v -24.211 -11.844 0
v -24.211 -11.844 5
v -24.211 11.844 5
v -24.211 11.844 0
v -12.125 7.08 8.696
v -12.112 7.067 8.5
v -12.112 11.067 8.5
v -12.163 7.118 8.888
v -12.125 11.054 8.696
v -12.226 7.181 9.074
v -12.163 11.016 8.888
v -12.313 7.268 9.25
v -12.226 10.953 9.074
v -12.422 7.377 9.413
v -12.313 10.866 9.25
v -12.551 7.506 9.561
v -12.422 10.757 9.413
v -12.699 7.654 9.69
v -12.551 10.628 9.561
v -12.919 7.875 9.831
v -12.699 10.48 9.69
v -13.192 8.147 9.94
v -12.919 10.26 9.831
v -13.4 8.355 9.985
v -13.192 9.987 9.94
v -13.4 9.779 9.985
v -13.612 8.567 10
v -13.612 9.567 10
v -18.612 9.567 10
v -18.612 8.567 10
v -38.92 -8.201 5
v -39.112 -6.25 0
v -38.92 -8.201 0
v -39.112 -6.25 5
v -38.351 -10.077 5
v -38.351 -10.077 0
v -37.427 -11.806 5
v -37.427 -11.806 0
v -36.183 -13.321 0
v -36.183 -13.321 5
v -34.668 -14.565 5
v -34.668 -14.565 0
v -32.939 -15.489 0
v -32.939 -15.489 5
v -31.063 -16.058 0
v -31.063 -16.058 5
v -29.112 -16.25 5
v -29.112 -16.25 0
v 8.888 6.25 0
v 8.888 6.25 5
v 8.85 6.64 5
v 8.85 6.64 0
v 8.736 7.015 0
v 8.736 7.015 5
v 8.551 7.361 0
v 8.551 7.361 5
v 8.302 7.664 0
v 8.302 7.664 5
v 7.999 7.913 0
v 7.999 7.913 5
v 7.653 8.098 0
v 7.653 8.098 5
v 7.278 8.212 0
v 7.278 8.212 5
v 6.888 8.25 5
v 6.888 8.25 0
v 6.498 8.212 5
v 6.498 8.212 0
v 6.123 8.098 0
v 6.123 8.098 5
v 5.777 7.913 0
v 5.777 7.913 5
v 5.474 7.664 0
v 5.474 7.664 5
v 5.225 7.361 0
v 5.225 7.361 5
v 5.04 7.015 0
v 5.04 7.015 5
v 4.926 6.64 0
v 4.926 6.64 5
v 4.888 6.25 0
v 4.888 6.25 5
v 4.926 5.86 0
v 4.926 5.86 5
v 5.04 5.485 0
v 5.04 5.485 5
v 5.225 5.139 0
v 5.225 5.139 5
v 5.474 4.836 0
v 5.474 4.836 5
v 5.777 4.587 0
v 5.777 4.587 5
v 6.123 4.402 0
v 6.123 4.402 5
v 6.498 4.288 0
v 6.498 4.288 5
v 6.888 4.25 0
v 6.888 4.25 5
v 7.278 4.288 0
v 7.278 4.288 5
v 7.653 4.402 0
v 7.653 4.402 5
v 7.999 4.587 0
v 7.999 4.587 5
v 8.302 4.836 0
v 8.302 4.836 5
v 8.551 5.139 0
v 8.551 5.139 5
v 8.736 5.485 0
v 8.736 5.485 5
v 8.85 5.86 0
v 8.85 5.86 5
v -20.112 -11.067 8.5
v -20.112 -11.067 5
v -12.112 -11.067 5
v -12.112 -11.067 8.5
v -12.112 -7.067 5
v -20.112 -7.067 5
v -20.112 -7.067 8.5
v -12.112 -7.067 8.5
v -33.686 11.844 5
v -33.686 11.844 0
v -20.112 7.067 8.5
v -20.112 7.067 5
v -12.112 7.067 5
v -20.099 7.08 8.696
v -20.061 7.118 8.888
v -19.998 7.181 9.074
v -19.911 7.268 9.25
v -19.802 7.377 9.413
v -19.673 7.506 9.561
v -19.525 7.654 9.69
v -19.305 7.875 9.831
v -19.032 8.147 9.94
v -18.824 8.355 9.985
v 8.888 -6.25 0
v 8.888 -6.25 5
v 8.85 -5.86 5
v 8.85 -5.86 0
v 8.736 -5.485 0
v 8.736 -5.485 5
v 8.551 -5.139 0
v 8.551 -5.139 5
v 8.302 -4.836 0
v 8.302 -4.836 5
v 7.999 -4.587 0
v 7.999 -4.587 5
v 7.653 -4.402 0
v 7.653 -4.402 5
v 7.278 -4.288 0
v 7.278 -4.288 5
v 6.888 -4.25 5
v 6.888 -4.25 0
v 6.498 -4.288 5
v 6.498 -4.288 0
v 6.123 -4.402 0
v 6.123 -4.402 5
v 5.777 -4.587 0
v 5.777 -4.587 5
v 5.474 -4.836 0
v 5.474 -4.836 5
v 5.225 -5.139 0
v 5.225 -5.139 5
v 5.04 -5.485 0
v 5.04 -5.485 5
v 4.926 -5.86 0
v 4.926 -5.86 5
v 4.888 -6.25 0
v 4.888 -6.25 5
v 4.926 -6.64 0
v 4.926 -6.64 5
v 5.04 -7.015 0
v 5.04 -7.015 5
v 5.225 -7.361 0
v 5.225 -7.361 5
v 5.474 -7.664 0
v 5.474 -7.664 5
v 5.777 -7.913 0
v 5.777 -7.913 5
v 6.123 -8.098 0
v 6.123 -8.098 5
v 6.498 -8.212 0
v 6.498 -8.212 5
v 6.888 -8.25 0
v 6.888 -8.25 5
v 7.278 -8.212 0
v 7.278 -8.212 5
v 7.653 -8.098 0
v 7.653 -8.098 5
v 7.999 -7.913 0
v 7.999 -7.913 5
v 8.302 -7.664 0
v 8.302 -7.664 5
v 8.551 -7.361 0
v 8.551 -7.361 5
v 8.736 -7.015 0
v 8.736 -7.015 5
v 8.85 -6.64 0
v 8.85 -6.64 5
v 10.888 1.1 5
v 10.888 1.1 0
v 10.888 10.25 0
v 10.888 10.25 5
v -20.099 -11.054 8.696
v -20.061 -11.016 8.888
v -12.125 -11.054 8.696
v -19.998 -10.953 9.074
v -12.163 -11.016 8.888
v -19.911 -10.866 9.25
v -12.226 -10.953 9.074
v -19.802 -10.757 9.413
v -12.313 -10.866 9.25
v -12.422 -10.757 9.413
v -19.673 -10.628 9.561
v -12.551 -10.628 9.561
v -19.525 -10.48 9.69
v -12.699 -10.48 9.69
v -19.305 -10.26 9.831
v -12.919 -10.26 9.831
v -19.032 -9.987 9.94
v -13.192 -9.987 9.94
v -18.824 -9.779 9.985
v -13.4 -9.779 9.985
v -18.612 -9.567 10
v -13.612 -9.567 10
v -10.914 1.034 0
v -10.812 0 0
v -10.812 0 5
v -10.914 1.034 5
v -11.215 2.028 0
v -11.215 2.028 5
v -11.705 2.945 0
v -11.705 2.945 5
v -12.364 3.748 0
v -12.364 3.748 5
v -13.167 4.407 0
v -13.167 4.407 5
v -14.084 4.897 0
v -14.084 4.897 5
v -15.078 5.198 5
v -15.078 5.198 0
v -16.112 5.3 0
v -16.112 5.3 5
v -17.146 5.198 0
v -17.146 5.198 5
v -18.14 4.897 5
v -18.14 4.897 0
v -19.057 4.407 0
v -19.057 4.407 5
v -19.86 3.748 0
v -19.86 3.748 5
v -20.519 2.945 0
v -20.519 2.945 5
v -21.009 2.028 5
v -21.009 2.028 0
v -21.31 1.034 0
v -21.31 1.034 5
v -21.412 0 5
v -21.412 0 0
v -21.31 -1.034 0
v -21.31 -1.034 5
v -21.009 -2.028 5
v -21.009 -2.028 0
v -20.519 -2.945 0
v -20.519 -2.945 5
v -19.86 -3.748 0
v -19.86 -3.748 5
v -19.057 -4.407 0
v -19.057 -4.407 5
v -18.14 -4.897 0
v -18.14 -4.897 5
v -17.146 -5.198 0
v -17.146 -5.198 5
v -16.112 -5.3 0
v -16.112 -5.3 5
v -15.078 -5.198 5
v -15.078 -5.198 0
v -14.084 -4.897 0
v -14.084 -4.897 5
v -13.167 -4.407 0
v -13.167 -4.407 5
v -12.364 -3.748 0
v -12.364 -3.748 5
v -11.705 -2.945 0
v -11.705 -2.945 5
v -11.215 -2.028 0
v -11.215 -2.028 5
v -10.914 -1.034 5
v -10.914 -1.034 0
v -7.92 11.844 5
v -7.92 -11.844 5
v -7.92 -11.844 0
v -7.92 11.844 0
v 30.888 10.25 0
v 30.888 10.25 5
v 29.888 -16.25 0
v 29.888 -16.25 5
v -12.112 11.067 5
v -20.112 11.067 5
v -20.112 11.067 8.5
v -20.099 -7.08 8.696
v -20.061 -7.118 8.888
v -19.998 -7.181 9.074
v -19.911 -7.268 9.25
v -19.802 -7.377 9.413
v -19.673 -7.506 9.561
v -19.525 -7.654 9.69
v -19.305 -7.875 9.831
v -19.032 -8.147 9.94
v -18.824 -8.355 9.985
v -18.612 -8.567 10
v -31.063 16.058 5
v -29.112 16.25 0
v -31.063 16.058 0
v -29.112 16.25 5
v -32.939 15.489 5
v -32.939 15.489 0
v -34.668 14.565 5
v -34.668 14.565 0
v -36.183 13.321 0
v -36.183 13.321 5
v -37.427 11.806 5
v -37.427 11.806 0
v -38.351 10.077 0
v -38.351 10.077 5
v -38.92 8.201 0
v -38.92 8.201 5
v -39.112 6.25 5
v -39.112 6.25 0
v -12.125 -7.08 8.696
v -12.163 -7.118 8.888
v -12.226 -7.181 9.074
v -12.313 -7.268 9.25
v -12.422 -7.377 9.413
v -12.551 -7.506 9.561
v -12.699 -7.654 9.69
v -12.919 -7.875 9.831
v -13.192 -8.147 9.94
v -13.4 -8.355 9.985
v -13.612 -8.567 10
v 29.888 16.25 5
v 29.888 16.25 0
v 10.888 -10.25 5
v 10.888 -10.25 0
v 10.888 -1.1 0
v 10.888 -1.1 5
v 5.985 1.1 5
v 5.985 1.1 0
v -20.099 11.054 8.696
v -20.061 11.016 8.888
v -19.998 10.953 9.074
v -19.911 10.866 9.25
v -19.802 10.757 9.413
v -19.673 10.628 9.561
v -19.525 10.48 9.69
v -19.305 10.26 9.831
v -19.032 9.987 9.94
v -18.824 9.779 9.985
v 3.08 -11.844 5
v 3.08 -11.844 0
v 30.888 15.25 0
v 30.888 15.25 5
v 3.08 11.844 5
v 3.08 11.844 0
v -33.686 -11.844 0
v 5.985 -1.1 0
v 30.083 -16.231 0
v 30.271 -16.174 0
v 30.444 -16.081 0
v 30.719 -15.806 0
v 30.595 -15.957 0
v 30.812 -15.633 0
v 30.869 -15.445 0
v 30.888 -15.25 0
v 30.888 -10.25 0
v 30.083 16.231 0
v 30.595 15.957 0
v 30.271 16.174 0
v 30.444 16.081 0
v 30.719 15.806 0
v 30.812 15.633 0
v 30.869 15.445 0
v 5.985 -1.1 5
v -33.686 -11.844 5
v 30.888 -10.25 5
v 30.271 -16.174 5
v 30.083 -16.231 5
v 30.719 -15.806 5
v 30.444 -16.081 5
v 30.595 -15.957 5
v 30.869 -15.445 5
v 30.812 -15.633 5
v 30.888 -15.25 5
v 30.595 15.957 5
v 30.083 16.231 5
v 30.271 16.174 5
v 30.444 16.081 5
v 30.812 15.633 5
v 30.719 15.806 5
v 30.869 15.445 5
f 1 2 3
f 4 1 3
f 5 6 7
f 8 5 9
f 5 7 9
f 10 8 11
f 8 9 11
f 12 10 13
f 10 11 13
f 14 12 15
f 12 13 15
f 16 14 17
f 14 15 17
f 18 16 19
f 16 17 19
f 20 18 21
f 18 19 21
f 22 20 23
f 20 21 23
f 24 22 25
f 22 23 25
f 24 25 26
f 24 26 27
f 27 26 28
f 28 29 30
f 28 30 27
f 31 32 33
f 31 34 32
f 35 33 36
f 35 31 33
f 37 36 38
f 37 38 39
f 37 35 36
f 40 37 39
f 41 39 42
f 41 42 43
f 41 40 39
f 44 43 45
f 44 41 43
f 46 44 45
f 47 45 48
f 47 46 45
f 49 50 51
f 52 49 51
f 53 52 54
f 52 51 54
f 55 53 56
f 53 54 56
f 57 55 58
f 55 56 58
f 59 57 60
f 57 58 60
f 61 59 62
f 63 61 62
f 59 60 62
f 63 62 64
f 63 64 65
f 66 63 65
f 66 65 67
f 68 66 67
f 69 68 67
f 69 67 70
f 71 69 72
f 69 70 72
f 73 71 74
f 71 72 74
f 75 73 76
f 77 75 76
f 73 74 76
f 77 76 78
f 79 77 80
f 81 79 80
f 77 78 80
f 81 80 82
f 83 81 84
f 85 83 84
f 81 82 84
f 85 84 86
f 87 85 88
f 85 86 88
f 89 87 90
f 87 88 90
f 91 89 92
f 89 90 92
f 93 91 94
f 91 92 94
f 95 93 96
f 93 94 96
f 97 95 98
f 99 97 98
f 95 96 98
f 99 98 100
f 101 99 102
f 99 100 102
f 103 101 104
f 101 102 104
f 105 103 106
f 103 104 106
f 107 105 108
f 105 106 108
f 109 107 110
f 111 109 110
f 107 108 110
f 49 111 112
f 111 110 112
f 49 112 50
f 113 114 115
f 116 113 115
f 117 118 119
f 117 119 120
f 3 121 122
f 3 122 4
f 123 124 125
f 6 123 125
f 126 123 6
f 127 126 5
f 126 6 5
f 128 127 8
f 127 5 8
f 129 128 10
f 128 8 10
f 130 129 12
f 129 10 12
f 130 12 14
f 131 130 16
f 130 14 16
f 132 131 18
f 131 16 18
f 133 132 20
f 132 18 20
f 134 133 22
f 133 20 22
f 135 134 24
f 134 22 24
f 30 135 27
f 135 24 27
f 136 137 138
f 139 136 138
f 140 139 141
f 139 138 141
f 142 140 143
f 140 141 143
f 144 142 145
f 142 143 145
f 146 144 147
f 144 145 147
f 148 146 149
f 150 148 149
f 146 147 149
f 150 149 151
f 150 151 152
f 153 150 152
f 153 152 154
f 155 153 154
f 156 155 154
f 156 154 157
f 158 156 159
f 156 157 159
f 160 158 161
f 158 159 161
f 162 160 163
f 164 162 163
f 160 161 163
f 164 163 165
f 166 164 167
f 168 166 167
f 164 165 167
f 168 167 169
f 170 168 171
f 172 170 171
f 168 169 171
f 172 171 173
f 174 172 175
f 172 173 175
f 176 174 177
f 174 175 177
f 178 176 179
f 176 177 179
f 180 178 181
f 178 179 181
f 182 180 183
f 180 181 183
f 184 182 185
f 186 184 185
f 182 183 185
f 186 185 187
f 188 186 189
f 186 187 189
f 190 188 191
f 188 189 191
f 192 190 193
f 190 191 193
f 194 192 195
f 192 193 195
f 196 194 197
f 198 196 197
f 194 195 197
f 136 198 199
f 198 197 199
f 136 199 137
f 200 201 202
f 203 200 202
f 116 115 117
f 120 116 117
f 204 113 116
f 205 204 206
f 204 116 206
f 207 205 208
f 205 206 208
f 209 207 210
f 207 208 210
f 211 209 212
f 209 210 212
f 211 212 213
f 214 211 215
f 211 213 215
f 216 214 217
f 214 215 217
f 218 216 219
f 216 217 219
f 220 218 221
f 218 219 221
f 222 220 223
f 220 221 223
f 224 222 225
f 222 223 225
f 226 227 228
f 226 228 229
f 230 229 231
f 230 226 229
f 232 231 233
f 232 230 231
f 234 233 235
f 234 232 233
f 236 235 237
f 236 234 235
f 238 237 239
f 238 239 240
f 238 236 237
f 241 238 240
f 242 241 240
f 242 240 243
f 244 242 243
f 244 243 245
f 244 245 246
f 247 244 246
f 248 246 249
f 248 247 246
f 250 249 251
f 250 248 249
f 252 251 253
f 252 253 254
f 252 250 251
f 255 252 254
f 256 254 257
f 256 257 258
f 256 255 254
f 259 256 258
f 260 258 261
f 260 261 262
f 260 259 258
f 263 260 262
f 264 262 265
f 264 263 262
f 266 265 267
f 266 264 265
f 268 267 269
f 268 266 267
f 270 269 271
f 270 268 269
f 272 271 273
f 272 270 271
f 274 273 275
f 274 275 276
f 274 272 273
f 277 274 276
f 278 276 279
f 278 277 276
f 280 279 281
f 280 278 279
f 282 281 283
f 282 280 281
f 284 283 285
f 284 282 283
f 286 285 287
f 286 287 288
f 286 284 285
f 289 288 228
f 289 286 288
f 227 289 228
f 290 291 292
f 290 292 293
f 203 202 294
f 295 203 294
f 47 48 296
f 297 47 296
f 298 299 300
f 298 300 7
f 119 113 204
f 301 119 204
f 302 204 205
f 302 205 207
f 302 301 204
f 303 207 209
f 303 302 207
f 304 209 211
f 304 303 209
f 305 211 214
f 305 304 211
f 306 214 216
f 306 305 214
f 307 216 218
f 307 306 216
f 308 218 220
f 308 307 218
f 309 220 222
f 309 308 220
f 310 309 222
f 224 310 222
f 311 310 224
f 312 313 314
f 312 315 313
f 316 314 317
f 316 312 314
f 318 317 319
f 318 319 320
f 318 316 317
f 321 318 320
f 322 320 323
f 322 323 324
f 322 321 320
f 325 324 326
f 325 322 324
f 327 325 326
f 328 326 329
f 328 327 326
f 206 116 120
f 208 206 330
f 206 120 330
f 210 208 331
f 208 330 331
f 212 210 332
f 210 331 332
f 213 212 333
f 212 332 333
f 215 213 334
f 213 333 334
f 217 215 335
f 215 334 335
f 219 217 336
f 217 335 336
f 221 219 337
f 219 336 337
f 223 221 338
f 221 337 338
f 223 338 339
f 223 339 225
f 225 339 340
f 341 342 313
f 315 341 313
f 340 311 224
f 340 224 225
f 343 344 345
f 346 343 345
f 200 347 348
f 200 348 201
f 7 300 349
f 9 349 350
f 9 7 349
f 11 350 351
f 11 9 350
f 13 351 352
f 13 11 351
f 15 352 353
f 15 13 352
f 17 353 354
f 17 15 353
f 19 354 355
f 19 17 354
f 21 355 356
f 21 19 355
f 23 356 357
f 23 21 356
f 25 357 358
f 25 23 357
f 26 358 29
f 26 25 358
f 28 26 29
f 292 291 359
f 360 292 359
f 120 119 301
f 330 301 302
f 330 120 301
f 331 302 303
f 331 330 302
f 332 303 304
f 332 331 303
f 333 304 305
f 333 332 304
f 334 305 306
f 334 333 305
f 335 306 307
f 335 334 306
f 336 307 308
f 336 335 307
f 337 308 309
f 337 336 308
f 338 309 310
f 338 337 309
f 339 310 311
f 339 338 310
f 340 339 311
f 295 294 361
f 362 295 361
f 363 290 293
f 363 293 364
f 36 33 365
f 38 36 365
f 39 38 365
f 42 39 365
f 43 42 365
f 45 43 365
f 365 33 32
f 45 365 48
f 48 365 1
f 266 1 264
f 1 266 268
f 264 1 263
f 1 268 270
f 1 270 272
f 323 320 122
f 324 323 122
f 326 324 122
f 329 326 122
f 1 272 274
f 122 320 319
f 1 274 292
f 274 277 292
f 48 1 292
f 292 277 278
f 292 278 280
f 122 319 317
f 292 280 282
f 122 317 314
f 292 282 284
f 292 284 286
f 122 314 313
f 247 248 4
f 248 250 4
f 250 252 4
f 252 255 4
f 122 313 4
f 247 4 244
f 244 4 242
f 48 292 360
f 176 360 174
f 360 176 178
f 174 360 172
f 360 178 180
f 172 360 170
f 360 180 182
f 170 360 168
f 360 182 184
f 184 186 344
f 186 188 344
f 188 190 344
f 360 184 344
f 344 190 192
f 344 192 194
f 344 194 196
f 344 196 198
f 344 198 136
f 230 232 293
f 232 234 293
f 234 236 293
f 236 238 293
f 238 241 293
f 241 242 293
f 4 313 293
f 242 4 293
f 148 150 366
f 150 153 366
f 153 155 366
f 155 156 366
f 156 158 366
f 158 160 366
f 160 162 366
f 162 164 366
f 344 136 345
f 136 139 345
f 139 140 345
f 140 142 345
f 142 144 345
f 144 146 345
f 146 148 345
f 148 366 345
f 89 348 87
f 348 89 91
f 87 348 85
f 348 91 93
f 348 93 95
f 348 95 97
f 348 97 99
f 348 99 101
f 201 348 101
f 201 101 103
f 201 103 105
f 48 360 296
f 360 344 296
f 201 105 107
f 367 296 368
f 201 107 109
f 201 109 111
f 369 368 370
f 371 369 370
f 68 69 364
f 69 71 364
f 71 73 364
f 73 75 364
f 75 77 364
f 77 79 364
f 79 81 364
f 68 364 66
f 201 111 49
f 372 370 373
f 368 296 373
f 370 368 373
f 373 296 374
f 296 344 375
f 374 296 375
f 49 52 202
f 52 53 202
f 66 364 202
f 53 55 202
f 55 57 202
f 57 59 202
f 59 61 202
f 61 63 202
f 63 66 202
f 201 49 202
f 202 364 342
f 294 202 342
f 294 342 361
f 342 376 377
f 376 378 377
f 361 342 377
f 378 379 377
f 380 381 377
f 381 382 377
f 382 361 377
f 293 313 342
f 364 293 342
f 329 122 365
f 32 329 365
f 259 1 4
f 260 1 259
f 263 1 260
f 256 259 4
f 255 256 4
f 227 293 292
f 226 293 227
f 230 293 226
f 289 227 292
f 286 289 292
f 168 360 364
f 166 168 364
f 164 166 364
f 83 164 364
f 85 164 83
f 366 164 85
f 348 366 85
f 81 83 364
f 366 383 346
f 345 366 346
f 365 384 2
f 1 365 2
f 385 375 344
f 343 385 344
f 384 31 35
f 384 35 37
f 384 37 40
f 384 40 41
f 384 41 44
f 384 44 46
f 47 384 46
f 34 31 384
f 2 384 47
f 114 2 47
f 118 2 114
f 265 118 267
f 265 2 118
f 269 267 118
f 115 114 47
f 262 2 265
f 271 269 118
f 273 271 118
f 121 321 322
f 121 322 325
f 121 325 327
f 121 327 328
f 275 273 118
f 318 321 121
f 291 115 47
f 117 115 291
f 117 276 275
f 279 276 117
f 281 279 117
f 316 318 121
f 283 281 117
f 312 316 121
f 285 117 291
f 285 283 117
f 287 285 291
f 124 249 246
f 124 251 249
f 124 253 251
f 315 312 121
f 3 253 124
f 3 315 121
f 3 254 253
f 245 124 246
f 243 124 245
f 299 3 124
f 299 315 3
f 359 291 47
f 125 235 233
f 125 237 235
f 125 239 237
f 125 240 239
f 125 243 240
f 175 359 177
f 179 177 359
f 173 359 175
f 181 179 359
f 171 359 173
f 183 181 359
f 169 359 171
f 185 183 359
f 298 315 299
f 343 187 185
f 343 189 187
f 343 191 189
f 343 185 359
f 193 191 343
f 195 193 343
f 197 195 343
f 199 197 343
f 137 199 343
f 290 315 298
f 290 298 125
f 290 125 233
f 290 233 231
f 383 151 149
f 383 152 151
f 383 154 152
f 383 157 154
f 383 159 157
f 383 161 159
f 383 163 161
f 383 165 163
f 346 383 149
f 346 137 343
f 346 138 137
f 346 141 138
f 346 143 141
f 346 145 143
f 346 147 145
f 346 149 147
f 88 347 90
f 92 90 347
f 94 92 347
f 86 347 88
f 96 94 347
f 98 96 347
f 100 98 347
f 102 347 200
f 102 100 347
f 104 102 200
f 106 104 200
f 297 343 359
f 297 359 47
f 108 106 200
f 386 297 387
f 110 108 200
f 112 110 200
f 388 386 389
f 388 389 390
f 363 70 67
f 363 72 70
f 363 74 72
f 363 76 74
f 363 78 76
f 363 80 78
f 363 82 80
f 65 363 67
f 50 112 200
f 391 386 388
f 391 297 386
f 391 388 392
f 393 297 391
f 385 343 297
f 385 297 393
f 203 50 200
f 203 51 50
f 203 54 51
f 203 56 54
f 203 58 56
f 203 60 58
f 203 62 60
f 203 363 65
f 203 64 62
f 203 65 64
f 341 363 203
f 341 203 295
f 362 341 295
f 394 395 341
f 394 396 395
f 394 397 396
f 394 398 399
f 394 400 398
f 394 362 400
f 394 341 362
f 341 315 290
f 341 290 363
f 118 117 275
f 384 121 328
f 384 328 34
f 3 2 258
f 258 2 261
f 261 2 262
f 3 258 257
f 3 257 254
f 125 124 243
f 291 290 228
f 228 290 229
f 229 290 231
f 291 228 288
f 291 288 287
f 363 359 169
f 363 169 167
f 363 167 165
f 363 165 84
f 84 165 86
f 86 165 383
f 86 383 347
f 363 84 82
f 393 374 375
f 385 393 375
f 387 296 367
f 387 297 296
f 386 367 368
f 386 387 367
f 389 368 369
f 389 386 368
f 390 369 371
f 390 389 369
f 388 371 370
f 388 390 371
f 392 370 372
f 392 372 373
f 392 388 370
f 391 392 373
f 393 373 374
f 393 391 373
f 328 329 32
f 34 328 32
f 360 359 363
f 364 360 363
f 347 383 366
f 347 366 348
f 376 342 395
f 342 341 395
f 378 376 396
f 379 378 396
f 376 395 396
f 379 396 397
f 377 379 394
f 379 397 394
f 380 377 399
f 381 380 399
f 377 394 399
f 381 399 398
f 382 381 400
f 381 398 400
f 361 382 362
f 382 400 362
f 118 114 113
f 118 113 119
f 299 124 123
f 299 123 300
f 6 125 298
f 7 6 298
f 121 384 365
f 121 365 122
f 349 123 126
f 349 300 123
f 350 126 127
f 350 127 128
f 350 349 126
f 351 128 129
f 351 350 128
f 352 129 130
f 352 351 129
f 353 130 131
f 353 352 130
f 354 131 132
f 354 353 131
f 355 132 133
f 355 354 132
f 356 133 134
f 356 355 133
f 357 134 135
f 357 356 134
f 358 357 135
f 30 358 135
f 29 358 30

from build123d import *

# Parameters (mm, degrees)
SKETCH_R      = 5.3
PAD_DEPTH     = 5
FILLET_R      = 10
FILLET001_R   = 1
SKETCH001_R   = 2
SKETCH001_W   = 9.475223
SKETCH001_H   = 23.68809
SKETCH001_W_2 = 11
SKETCH001_W_3 = 4.903309
SKETCH001_H_2 = 2.2
POCKET_DEPTH  = 5
SKETCH002_W   = 8
SKETCH002_H   = 4
PAD001_DEPTH  = 5
FILLET002_R   = 1.5


with BuildPart() as part:
    # Sketch → Pad (new body)
    with BuildSketch(Plane.XY):
        Polygon((30.887989, 10.25), (30.887989, 16.25), (-39.112011, 16.25), (-39.112011, -16.25), (30.887989, -16.25), (30.887989, -10.25), (10.887989, -10.25), (10.887989, 10.25), align=None)
        with Locations((-16.112011, 0)):
            Circle(SKETCH_R, mode=Mode.SUBTRACT)
    extrude(amount=PAD_DEPTH)

    # Fillet
    fillet_edges = [part.edges().sort_by_distance(p)[0] for p in [
        (-39.112011, -16.25, 2.5),
        (-39.112011, 16.25, 2.5),
    ]]
    fillet(fillet_edges, radius=FILLET_R)

    # Fillet001
    fillet001_edges = [part.edges().sort_by_distance(p)[0] for p in [
        (30.887989, -16.25, 2.5),
        (30.887989, 16.25, 2.5),
    ]]
    fillet(fillet001_edges, radius=FILLET001_R)

    # Sketch001 (on Face5 of Fillet001) → Pocket (cut)
    with BuildSketch(Plane.XY.offset(5)):
        with Locations((6.887989, 6.25)):
            Circle(SKETCH001_R)
        with Locations((6.887989, -6.25)):
            Circle(SKETCH001_R)
        with Locations((-28.9485835, 0)):
            Rectangle(SKETCH001_W, SKETCH001_H)
        with Locations((-2.4204911845, 0)):
            Rectangle(SKETCH001_W_2, SKETCH001_H)
        with Locations((8.4363345, 0)):
            Rectangle(SKETCH001_W_3, SKETCH001_H_2)
    extrude(amount=-POCKET_DEPTH, mode=Mode.SUBTRACT)

    # Sketch002 (on Face5 of Pocket) → Pad001 (join)
    with BuildSketch(Plane.XY.offset(5)):
        with Locations((-16.112011, 9.067142847)):
            Rectangle(SKETCH002_W, SKETCH002_H)
        with Locations((-16.112011, -9.067142847)):
            Rectangle(SKETCH002_W, SKETCH002_H)
    extrude(amount=PAD001_DEPTH)

    # Fillet002
    fillet002_edges = [part.edges().sort_by_distance(p)[0] for p in [
        (-16.112011, 11.067143, 10),
        (-12.112011, 9.067143, 10),
        (-16.112011, 7.067143, 10),
        (-20.112011, 9.067143, 10),
        (-16.112011, -7.067143, 10),
        (-12.112011, -9.067143, 10),
        (-16.112011, -11.067143, 10),
        (-20.112011, -9.067143, 10),
    ]]
    fillet(fillet002_edges, radius=FILLET002_R)


solid = part.part
